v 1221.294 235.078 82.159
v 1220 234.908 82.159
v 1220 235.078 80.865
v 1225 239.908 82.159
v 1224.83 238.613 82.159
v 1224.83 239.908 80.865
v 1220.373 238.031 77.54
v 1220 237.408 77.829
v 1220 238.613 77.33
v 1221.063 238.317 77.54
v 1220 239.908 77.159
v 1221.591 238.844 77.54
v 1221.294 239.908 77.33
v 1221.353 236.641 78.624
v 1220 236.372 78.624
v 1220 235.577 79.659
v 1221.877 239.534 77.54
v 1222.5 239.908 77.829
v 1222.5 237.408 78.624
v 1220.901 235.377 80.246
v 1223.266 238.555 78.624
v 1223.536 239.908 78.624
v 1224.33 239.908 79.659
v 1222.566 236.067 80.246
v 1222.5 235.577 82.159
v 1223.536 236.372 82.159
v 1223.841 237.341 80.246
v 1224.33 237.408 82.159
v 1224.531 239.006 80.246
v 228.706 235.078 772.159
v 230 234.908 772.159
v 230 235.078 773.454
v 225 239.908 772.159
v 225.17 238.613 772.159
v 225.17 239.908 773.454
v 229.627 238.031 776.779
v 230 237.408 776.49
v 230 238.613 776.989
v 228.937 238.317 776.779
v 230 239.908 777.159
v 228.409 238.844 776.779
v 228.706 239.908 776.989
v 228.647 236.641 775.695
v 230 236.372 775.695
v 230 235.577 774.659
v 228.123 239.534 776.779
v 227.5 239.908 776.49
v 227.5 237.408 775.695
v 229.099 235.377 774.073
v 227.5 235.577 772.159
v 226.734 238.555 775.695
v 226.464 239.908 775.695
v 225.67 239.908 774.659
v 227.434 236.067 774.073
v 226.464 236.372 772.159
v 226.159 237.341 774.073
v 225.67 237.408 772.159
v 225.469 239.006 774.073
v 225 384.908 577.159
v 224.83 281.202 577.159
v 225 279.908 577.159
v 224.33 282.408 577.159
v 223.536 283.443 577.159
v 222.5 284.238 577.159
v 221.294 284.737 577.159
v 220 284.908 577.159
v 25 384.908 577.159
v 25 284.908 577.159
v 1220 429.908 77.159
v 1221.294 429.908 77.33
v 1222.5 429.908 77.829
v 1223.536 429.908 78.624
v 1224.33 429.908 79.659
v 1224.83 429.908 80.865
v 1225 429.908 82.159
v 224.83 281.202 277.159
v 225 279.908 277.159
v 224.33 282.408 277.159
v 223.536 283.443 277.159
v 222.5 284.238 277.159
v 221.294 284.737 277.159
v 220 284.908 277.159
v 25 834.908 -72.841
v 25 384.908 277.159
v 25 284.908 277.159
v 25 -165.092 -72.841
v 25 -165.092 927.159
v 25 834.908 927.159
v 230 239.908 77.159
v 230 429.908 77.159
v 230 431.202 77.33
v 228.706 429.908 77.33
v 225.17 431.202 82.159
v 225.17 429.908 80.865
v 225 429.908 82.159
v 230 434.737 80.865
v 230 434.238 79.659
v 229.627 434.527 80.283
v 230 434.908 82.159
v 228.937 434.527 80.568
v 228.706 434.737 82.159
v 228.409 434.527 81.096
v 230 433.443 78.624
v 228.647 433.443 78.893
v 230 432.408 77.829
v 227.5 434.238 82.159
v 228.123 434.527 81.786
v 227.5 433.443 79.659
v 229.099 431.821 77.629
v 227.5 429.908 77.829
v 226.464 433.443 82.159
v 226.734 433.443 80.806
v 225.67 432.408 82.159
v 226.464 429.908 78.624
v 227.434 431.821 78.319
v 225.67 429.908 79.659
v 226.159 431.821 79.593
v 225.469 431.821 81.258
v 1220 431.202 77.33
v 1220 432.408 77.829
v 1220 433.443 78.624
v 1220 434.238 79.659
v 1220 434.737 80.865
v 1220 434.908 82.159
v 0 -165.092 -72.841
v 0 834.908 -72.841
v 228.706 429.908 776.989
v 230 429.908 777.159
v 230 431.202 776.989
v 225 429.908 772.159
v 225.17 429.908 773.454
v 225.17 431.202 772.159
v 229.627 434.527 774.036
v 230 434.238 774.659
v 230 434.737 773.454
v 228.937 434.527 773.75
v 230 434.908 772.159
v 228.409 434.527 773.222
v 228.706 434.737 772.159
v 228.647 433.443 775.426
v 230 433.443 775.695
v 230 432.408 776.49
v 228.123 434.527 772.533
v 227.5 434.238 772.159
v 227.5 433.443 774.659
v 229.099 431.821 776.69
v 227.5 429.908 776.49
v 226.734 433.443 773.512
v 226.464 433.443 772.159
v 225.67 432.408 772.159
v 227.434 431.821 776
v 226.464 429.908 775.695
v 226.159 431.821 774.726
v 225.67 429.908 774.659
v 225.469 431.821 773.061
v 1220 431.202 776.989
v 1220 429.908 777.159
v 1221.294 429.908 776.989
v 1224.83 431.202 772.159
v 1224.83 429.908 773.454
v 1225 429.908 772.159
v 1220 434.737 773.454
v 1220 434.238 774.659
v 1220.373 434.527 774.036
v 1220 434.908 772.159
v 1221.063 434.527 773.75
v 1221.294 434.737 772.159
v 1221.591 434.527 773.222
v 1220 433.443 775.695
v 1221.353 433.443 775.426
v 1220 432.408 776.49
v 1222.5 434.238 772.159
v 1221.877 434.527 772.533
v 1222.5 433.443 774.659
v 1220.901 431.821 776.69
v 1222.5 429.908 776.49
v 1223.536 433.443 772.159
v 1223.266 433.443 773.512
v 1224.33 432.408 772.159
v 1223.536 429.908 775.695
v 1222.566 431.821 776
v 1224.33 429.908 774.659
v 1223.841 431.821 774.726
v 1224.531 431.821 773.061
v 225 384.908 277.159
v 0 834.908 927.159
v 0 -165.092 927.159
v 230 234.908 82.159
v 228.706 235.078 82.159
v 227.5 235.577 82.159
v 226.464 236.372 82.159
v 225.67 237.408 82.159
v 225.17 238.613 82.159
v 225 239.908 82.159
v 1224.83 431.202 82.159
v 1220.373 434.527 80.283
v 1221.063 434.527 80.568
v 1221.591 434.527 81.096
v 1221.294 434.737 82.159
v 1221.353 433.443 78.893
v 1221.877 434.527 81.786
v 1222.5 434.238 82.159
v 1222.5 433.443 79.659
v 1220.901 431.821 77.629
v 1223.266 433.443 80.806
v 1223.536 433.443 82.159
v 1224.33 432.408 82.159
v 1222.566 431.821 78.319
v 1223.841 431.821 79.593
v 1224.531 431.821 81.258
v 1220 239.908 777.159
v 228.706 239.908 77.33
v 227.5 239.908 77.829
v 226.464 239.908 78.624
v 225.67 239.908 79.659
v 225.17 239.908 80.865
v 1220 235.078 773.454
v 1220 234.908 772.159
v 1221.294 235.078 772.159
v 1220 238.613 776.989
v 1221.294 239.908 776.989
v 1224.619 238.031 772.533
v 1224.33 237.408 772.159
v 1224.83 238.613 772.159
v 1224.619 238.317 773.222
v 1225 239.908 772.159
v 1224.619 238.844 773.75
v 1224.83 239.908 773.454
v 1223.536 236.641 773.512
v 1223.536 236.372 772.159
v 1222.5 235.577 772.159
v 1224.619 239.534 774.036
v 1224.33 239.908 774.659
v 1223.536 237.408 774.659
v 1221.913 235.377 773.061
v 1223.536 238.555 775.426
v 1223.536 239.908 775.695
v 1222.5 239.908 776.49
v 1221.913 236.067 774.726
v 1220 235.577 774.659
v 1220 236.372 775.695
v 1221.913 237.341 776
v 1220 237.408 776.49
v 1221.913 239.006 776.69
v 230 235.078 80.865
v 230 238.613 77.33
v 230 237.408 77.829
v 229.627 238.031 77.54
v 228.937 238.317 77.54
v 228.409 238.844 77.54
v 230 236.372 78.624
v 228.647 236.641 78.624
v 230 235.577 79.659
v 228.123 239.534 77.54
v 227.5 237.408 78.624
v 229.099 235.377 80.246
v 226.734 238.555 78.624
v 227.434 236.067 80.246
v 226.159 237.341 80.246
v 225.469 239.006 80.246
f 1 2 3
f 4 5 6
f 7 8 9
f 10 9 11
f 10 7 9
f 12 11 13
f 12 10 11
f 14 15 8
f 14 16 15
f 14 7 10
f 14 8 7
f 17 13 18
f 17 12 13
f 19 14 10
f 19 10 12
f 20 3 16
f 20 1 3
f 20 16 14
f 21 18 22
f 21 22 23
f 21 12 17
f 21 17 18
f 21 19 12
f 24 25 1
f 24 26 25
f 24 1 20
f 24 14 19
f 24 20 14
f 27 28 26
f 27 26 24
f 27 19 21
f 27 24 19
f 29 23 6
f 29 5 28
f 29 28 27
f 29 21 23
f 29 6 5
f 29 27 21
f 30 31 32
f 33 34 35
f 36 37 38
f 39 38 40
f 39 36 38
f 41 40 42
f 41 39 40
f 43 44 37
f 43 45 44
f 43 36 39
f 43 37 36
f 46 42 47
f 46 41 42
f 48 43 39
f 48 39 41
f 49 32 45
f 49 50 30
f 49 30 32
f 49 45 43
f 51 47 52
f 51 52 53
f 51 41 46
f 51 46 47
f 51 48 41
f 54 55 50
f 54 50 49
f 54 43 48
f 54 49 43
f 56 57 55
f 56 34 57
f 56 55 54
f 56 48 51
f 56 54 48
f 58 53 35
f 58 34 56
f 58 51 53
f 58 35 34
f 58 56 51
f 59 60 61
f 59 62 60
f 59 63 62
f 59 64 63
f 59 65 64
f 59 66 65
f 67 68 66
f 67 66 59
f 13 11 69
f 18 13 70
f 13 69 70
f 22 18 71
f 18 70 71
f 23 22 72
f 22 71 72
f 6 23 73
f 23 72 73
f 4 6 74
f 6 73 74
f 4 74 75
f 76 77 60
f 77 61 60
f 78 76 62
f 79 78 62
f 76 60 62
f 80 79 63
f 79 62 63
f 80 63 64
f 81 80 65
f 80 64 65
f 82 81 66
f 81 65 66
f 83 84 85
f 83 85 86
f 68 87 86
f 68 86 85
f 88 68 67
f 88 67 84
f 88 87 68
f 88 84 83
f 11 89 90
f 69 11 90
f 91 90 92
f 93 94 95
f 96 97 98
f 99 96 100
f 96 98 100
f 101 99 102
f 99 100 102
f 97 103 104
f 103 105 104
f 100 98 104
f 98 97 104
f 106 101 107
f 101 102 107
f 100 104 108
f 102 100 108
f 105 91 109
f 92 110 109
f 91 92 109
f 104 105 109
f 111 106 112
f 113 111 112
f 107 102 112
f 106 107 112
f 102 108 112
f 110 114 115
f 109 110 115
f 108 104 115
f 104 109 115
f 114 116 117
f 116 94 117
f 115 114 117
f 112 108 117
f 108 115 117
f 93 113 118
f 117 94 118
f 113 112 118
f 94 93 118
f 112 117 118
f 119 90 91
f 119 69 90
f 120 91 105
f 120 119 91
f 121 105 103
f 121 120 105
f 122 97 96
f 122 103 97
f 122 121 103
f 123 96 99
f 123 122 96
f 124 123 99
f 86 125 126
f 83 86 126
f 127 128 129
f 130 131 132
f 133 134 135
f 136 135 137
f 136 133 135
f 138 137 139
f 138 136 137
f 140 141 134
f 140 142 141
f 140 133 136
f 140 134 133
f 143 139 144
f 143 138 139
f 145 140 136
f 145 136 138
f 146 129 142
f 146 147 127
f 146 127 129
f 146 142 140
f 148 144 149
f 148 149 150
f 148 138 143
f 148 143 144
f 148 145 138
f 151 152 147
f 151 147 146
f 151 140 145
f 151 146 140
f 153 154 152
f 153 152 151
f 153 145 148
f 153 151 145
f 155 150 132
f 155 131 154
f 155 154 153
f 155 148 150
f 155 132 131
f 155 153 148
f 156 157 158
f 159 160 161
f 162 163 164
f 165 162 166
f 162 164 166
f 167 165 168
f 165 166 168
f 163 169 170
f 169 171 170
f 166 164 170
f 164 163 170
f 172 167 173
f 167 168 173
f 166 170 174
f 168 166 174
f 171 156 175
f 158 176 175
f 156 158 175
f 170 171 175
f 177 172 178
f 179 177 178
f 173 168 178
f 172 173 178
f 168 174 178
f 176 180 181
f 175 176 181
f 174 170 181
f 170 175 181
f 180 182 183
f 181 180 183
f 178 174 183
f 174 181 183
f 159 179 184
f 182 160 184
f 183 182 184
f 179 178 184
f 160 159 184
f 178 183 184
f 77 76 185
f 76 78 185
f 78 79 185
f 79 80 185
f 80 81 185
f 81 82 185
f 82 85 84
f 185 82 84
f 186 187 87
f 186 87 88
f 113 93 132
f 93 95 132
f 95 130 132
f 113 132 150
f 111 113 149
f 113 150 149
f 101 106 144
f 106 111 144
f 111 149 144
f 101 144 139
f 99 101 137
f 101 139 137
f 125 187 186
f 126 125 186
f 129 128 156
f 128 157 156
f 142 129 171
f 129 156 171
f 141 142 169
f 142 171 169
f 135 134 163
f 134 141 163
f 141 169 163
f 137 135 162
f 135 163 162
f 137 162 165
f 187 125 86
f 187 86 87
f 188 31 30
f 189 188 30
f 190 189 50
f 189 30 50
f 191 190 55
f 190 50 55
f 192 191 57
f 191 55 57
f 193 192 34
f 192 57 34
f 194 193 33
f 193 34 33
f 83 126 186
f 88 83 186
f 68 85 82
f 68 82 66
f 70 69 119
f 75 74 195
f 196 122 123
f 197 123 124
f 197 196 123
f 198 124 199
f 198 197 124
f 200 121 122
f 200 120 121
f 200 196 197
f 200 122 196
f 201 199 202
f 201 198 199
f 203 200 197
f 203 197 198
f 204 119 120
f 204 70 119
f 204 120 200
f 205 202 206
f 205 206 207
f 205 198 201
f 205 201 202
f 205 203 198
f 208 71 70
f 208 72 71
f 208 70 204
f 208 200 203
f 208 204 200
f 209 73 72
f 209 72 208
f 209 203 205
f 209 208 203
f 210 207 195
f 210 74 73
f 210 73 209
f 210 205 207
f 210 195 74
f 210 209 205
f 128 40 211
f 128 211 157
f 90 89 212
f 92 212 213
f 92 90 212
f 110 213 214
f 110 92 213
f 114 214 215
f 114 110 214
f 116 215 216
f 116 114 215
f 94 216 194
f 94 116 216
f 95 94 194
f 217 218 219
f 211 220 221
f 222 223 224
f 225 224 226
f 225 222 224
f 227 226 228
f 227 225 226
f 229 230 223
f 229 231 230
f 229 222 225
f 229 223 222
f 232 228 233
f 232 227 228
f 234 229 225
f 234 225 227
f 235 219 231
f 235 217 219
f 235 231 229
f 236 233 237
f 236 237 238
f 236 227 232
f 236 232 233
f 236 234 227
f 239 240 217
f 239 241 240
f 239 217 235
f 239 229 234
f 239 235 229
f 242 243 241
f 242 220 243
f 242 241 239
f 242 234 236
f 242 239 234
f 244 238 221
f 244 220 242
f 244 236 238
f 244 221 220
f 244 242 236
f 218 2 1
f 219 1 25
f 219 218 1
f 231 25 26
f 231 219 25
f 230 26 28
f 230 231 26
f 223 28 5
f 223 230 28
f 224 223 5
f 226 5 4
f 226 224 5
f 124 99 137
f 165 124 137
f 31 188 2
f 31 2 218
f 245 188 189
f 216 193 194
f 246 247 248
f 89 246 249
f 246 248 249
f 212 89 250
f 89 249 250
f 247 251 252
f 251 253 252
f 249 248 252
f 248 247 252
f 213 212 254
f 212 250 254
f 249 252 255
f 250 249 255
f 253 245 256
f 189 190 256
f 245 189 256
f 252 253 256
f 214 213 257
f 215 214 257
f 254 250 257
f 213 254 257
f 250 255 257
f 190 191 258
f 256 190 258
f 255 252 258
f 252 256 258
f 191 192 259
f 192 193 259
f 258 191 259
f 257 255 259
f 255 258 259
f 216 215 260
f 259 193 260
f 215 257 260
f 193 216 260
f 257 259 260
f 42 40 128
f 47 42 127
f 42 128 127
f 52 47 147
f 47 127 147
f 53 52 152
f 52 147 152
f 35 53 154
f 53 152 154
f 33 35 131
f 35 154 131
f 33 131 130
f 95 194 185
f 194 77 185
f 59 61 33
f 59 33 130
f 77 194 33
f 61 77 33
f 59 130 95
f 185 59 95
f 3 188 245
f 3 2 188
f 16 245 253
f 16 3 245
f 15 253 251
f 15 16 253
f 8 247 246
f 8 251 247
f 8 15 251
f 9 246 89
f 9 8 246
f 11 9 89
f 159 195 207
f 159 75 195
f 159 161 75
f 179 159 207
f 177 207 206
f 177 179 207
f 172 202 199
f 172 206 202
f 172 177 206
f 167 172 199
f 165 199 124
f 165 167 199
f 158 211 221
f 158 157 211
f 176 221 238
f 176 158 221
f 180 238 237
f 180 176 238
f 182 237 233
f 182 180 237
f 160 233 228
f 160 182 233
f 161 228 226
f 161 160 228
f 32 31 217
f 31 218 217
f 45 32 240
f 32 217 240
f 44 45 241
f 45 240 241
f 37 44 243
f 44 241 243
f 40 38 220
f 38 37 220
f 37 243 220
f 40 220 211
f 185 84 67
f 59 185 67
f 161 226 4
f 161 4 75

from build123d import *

# Parameters (mm, degrees)
F0_W     = 1000
F0_H     = 1000
F1_DEPTH = 25
F2_W     = 100
F2_H     = 300
F3_DEPTH = 200
F4_W     = 200
F4_H     = 700
F4_W_2   = 100
F4_H_2   = 300
F5_DEPTH = 1000
F6_R     = 5


# Not quite as in the source:
# - two fillets or chamfers of one size are made in one step


with BuildPart() as f1:
    # F0 (on Right) → F1 (new body)
    with BuildSketch(Plane.YZ):
        with Locations((334.907528758, 427.1594434977)):
            Rectangle(F0_W, F0_H)
    extrude(amount=F1_DEPTH)

    # F2 (on face) → F3 (join)
    with BuildSketch(Plane.YZ.offset(25)):
        with Locations((334.907528758, 427.1594434977)):
            Rectangle(F2_W, F2_H)
    extrude(amount=F3_DEPTH)

    # F4 (on face) → F5 (join)
    with BuildSketch(Plane.YZ.offset(225)):
        with Locations((334.907528758, 427.1594434977)):
            Rectangle(F4_W, F4_H)
        with Locations((334.907528758, 427.1594434977)):
            Rectangle(F4_W_2, F4_H_2, mode=Mode.SUBTRACT)
        with Locations((334.907528758, 427.1594434977)):
            Rectangle(F4_W_2, F4_H_2)
    extrude(amount=F5_DEPTH)

    # F6
    f6_edges = [f1.edges().sort_by_distance(p)[0] for p in [
        (225, 234.907529, 427.159443),
        (225, 284.907529, 427.159443),
        (725, 234.907529, 777.159443),
        (1225, 234.907529, 427.159443),
        (1225, 334.907529, 777.159443),
        (725, 234.907529, 77.159443),
        (225, 334.907529, 77.159443),
        (1225, 334.907529, 77.159443),
        (225, 334.907529, 777.159443),
        (725, 434.907529, 77.159443),
        (725, 434.907529, 777.159443),
        (225, 434.907529, 427.159443),
        (1225, 434.907529, 427.159443),
    ]]
    fillet(f6_edges, radius=F6_R)


solid = f1.part
